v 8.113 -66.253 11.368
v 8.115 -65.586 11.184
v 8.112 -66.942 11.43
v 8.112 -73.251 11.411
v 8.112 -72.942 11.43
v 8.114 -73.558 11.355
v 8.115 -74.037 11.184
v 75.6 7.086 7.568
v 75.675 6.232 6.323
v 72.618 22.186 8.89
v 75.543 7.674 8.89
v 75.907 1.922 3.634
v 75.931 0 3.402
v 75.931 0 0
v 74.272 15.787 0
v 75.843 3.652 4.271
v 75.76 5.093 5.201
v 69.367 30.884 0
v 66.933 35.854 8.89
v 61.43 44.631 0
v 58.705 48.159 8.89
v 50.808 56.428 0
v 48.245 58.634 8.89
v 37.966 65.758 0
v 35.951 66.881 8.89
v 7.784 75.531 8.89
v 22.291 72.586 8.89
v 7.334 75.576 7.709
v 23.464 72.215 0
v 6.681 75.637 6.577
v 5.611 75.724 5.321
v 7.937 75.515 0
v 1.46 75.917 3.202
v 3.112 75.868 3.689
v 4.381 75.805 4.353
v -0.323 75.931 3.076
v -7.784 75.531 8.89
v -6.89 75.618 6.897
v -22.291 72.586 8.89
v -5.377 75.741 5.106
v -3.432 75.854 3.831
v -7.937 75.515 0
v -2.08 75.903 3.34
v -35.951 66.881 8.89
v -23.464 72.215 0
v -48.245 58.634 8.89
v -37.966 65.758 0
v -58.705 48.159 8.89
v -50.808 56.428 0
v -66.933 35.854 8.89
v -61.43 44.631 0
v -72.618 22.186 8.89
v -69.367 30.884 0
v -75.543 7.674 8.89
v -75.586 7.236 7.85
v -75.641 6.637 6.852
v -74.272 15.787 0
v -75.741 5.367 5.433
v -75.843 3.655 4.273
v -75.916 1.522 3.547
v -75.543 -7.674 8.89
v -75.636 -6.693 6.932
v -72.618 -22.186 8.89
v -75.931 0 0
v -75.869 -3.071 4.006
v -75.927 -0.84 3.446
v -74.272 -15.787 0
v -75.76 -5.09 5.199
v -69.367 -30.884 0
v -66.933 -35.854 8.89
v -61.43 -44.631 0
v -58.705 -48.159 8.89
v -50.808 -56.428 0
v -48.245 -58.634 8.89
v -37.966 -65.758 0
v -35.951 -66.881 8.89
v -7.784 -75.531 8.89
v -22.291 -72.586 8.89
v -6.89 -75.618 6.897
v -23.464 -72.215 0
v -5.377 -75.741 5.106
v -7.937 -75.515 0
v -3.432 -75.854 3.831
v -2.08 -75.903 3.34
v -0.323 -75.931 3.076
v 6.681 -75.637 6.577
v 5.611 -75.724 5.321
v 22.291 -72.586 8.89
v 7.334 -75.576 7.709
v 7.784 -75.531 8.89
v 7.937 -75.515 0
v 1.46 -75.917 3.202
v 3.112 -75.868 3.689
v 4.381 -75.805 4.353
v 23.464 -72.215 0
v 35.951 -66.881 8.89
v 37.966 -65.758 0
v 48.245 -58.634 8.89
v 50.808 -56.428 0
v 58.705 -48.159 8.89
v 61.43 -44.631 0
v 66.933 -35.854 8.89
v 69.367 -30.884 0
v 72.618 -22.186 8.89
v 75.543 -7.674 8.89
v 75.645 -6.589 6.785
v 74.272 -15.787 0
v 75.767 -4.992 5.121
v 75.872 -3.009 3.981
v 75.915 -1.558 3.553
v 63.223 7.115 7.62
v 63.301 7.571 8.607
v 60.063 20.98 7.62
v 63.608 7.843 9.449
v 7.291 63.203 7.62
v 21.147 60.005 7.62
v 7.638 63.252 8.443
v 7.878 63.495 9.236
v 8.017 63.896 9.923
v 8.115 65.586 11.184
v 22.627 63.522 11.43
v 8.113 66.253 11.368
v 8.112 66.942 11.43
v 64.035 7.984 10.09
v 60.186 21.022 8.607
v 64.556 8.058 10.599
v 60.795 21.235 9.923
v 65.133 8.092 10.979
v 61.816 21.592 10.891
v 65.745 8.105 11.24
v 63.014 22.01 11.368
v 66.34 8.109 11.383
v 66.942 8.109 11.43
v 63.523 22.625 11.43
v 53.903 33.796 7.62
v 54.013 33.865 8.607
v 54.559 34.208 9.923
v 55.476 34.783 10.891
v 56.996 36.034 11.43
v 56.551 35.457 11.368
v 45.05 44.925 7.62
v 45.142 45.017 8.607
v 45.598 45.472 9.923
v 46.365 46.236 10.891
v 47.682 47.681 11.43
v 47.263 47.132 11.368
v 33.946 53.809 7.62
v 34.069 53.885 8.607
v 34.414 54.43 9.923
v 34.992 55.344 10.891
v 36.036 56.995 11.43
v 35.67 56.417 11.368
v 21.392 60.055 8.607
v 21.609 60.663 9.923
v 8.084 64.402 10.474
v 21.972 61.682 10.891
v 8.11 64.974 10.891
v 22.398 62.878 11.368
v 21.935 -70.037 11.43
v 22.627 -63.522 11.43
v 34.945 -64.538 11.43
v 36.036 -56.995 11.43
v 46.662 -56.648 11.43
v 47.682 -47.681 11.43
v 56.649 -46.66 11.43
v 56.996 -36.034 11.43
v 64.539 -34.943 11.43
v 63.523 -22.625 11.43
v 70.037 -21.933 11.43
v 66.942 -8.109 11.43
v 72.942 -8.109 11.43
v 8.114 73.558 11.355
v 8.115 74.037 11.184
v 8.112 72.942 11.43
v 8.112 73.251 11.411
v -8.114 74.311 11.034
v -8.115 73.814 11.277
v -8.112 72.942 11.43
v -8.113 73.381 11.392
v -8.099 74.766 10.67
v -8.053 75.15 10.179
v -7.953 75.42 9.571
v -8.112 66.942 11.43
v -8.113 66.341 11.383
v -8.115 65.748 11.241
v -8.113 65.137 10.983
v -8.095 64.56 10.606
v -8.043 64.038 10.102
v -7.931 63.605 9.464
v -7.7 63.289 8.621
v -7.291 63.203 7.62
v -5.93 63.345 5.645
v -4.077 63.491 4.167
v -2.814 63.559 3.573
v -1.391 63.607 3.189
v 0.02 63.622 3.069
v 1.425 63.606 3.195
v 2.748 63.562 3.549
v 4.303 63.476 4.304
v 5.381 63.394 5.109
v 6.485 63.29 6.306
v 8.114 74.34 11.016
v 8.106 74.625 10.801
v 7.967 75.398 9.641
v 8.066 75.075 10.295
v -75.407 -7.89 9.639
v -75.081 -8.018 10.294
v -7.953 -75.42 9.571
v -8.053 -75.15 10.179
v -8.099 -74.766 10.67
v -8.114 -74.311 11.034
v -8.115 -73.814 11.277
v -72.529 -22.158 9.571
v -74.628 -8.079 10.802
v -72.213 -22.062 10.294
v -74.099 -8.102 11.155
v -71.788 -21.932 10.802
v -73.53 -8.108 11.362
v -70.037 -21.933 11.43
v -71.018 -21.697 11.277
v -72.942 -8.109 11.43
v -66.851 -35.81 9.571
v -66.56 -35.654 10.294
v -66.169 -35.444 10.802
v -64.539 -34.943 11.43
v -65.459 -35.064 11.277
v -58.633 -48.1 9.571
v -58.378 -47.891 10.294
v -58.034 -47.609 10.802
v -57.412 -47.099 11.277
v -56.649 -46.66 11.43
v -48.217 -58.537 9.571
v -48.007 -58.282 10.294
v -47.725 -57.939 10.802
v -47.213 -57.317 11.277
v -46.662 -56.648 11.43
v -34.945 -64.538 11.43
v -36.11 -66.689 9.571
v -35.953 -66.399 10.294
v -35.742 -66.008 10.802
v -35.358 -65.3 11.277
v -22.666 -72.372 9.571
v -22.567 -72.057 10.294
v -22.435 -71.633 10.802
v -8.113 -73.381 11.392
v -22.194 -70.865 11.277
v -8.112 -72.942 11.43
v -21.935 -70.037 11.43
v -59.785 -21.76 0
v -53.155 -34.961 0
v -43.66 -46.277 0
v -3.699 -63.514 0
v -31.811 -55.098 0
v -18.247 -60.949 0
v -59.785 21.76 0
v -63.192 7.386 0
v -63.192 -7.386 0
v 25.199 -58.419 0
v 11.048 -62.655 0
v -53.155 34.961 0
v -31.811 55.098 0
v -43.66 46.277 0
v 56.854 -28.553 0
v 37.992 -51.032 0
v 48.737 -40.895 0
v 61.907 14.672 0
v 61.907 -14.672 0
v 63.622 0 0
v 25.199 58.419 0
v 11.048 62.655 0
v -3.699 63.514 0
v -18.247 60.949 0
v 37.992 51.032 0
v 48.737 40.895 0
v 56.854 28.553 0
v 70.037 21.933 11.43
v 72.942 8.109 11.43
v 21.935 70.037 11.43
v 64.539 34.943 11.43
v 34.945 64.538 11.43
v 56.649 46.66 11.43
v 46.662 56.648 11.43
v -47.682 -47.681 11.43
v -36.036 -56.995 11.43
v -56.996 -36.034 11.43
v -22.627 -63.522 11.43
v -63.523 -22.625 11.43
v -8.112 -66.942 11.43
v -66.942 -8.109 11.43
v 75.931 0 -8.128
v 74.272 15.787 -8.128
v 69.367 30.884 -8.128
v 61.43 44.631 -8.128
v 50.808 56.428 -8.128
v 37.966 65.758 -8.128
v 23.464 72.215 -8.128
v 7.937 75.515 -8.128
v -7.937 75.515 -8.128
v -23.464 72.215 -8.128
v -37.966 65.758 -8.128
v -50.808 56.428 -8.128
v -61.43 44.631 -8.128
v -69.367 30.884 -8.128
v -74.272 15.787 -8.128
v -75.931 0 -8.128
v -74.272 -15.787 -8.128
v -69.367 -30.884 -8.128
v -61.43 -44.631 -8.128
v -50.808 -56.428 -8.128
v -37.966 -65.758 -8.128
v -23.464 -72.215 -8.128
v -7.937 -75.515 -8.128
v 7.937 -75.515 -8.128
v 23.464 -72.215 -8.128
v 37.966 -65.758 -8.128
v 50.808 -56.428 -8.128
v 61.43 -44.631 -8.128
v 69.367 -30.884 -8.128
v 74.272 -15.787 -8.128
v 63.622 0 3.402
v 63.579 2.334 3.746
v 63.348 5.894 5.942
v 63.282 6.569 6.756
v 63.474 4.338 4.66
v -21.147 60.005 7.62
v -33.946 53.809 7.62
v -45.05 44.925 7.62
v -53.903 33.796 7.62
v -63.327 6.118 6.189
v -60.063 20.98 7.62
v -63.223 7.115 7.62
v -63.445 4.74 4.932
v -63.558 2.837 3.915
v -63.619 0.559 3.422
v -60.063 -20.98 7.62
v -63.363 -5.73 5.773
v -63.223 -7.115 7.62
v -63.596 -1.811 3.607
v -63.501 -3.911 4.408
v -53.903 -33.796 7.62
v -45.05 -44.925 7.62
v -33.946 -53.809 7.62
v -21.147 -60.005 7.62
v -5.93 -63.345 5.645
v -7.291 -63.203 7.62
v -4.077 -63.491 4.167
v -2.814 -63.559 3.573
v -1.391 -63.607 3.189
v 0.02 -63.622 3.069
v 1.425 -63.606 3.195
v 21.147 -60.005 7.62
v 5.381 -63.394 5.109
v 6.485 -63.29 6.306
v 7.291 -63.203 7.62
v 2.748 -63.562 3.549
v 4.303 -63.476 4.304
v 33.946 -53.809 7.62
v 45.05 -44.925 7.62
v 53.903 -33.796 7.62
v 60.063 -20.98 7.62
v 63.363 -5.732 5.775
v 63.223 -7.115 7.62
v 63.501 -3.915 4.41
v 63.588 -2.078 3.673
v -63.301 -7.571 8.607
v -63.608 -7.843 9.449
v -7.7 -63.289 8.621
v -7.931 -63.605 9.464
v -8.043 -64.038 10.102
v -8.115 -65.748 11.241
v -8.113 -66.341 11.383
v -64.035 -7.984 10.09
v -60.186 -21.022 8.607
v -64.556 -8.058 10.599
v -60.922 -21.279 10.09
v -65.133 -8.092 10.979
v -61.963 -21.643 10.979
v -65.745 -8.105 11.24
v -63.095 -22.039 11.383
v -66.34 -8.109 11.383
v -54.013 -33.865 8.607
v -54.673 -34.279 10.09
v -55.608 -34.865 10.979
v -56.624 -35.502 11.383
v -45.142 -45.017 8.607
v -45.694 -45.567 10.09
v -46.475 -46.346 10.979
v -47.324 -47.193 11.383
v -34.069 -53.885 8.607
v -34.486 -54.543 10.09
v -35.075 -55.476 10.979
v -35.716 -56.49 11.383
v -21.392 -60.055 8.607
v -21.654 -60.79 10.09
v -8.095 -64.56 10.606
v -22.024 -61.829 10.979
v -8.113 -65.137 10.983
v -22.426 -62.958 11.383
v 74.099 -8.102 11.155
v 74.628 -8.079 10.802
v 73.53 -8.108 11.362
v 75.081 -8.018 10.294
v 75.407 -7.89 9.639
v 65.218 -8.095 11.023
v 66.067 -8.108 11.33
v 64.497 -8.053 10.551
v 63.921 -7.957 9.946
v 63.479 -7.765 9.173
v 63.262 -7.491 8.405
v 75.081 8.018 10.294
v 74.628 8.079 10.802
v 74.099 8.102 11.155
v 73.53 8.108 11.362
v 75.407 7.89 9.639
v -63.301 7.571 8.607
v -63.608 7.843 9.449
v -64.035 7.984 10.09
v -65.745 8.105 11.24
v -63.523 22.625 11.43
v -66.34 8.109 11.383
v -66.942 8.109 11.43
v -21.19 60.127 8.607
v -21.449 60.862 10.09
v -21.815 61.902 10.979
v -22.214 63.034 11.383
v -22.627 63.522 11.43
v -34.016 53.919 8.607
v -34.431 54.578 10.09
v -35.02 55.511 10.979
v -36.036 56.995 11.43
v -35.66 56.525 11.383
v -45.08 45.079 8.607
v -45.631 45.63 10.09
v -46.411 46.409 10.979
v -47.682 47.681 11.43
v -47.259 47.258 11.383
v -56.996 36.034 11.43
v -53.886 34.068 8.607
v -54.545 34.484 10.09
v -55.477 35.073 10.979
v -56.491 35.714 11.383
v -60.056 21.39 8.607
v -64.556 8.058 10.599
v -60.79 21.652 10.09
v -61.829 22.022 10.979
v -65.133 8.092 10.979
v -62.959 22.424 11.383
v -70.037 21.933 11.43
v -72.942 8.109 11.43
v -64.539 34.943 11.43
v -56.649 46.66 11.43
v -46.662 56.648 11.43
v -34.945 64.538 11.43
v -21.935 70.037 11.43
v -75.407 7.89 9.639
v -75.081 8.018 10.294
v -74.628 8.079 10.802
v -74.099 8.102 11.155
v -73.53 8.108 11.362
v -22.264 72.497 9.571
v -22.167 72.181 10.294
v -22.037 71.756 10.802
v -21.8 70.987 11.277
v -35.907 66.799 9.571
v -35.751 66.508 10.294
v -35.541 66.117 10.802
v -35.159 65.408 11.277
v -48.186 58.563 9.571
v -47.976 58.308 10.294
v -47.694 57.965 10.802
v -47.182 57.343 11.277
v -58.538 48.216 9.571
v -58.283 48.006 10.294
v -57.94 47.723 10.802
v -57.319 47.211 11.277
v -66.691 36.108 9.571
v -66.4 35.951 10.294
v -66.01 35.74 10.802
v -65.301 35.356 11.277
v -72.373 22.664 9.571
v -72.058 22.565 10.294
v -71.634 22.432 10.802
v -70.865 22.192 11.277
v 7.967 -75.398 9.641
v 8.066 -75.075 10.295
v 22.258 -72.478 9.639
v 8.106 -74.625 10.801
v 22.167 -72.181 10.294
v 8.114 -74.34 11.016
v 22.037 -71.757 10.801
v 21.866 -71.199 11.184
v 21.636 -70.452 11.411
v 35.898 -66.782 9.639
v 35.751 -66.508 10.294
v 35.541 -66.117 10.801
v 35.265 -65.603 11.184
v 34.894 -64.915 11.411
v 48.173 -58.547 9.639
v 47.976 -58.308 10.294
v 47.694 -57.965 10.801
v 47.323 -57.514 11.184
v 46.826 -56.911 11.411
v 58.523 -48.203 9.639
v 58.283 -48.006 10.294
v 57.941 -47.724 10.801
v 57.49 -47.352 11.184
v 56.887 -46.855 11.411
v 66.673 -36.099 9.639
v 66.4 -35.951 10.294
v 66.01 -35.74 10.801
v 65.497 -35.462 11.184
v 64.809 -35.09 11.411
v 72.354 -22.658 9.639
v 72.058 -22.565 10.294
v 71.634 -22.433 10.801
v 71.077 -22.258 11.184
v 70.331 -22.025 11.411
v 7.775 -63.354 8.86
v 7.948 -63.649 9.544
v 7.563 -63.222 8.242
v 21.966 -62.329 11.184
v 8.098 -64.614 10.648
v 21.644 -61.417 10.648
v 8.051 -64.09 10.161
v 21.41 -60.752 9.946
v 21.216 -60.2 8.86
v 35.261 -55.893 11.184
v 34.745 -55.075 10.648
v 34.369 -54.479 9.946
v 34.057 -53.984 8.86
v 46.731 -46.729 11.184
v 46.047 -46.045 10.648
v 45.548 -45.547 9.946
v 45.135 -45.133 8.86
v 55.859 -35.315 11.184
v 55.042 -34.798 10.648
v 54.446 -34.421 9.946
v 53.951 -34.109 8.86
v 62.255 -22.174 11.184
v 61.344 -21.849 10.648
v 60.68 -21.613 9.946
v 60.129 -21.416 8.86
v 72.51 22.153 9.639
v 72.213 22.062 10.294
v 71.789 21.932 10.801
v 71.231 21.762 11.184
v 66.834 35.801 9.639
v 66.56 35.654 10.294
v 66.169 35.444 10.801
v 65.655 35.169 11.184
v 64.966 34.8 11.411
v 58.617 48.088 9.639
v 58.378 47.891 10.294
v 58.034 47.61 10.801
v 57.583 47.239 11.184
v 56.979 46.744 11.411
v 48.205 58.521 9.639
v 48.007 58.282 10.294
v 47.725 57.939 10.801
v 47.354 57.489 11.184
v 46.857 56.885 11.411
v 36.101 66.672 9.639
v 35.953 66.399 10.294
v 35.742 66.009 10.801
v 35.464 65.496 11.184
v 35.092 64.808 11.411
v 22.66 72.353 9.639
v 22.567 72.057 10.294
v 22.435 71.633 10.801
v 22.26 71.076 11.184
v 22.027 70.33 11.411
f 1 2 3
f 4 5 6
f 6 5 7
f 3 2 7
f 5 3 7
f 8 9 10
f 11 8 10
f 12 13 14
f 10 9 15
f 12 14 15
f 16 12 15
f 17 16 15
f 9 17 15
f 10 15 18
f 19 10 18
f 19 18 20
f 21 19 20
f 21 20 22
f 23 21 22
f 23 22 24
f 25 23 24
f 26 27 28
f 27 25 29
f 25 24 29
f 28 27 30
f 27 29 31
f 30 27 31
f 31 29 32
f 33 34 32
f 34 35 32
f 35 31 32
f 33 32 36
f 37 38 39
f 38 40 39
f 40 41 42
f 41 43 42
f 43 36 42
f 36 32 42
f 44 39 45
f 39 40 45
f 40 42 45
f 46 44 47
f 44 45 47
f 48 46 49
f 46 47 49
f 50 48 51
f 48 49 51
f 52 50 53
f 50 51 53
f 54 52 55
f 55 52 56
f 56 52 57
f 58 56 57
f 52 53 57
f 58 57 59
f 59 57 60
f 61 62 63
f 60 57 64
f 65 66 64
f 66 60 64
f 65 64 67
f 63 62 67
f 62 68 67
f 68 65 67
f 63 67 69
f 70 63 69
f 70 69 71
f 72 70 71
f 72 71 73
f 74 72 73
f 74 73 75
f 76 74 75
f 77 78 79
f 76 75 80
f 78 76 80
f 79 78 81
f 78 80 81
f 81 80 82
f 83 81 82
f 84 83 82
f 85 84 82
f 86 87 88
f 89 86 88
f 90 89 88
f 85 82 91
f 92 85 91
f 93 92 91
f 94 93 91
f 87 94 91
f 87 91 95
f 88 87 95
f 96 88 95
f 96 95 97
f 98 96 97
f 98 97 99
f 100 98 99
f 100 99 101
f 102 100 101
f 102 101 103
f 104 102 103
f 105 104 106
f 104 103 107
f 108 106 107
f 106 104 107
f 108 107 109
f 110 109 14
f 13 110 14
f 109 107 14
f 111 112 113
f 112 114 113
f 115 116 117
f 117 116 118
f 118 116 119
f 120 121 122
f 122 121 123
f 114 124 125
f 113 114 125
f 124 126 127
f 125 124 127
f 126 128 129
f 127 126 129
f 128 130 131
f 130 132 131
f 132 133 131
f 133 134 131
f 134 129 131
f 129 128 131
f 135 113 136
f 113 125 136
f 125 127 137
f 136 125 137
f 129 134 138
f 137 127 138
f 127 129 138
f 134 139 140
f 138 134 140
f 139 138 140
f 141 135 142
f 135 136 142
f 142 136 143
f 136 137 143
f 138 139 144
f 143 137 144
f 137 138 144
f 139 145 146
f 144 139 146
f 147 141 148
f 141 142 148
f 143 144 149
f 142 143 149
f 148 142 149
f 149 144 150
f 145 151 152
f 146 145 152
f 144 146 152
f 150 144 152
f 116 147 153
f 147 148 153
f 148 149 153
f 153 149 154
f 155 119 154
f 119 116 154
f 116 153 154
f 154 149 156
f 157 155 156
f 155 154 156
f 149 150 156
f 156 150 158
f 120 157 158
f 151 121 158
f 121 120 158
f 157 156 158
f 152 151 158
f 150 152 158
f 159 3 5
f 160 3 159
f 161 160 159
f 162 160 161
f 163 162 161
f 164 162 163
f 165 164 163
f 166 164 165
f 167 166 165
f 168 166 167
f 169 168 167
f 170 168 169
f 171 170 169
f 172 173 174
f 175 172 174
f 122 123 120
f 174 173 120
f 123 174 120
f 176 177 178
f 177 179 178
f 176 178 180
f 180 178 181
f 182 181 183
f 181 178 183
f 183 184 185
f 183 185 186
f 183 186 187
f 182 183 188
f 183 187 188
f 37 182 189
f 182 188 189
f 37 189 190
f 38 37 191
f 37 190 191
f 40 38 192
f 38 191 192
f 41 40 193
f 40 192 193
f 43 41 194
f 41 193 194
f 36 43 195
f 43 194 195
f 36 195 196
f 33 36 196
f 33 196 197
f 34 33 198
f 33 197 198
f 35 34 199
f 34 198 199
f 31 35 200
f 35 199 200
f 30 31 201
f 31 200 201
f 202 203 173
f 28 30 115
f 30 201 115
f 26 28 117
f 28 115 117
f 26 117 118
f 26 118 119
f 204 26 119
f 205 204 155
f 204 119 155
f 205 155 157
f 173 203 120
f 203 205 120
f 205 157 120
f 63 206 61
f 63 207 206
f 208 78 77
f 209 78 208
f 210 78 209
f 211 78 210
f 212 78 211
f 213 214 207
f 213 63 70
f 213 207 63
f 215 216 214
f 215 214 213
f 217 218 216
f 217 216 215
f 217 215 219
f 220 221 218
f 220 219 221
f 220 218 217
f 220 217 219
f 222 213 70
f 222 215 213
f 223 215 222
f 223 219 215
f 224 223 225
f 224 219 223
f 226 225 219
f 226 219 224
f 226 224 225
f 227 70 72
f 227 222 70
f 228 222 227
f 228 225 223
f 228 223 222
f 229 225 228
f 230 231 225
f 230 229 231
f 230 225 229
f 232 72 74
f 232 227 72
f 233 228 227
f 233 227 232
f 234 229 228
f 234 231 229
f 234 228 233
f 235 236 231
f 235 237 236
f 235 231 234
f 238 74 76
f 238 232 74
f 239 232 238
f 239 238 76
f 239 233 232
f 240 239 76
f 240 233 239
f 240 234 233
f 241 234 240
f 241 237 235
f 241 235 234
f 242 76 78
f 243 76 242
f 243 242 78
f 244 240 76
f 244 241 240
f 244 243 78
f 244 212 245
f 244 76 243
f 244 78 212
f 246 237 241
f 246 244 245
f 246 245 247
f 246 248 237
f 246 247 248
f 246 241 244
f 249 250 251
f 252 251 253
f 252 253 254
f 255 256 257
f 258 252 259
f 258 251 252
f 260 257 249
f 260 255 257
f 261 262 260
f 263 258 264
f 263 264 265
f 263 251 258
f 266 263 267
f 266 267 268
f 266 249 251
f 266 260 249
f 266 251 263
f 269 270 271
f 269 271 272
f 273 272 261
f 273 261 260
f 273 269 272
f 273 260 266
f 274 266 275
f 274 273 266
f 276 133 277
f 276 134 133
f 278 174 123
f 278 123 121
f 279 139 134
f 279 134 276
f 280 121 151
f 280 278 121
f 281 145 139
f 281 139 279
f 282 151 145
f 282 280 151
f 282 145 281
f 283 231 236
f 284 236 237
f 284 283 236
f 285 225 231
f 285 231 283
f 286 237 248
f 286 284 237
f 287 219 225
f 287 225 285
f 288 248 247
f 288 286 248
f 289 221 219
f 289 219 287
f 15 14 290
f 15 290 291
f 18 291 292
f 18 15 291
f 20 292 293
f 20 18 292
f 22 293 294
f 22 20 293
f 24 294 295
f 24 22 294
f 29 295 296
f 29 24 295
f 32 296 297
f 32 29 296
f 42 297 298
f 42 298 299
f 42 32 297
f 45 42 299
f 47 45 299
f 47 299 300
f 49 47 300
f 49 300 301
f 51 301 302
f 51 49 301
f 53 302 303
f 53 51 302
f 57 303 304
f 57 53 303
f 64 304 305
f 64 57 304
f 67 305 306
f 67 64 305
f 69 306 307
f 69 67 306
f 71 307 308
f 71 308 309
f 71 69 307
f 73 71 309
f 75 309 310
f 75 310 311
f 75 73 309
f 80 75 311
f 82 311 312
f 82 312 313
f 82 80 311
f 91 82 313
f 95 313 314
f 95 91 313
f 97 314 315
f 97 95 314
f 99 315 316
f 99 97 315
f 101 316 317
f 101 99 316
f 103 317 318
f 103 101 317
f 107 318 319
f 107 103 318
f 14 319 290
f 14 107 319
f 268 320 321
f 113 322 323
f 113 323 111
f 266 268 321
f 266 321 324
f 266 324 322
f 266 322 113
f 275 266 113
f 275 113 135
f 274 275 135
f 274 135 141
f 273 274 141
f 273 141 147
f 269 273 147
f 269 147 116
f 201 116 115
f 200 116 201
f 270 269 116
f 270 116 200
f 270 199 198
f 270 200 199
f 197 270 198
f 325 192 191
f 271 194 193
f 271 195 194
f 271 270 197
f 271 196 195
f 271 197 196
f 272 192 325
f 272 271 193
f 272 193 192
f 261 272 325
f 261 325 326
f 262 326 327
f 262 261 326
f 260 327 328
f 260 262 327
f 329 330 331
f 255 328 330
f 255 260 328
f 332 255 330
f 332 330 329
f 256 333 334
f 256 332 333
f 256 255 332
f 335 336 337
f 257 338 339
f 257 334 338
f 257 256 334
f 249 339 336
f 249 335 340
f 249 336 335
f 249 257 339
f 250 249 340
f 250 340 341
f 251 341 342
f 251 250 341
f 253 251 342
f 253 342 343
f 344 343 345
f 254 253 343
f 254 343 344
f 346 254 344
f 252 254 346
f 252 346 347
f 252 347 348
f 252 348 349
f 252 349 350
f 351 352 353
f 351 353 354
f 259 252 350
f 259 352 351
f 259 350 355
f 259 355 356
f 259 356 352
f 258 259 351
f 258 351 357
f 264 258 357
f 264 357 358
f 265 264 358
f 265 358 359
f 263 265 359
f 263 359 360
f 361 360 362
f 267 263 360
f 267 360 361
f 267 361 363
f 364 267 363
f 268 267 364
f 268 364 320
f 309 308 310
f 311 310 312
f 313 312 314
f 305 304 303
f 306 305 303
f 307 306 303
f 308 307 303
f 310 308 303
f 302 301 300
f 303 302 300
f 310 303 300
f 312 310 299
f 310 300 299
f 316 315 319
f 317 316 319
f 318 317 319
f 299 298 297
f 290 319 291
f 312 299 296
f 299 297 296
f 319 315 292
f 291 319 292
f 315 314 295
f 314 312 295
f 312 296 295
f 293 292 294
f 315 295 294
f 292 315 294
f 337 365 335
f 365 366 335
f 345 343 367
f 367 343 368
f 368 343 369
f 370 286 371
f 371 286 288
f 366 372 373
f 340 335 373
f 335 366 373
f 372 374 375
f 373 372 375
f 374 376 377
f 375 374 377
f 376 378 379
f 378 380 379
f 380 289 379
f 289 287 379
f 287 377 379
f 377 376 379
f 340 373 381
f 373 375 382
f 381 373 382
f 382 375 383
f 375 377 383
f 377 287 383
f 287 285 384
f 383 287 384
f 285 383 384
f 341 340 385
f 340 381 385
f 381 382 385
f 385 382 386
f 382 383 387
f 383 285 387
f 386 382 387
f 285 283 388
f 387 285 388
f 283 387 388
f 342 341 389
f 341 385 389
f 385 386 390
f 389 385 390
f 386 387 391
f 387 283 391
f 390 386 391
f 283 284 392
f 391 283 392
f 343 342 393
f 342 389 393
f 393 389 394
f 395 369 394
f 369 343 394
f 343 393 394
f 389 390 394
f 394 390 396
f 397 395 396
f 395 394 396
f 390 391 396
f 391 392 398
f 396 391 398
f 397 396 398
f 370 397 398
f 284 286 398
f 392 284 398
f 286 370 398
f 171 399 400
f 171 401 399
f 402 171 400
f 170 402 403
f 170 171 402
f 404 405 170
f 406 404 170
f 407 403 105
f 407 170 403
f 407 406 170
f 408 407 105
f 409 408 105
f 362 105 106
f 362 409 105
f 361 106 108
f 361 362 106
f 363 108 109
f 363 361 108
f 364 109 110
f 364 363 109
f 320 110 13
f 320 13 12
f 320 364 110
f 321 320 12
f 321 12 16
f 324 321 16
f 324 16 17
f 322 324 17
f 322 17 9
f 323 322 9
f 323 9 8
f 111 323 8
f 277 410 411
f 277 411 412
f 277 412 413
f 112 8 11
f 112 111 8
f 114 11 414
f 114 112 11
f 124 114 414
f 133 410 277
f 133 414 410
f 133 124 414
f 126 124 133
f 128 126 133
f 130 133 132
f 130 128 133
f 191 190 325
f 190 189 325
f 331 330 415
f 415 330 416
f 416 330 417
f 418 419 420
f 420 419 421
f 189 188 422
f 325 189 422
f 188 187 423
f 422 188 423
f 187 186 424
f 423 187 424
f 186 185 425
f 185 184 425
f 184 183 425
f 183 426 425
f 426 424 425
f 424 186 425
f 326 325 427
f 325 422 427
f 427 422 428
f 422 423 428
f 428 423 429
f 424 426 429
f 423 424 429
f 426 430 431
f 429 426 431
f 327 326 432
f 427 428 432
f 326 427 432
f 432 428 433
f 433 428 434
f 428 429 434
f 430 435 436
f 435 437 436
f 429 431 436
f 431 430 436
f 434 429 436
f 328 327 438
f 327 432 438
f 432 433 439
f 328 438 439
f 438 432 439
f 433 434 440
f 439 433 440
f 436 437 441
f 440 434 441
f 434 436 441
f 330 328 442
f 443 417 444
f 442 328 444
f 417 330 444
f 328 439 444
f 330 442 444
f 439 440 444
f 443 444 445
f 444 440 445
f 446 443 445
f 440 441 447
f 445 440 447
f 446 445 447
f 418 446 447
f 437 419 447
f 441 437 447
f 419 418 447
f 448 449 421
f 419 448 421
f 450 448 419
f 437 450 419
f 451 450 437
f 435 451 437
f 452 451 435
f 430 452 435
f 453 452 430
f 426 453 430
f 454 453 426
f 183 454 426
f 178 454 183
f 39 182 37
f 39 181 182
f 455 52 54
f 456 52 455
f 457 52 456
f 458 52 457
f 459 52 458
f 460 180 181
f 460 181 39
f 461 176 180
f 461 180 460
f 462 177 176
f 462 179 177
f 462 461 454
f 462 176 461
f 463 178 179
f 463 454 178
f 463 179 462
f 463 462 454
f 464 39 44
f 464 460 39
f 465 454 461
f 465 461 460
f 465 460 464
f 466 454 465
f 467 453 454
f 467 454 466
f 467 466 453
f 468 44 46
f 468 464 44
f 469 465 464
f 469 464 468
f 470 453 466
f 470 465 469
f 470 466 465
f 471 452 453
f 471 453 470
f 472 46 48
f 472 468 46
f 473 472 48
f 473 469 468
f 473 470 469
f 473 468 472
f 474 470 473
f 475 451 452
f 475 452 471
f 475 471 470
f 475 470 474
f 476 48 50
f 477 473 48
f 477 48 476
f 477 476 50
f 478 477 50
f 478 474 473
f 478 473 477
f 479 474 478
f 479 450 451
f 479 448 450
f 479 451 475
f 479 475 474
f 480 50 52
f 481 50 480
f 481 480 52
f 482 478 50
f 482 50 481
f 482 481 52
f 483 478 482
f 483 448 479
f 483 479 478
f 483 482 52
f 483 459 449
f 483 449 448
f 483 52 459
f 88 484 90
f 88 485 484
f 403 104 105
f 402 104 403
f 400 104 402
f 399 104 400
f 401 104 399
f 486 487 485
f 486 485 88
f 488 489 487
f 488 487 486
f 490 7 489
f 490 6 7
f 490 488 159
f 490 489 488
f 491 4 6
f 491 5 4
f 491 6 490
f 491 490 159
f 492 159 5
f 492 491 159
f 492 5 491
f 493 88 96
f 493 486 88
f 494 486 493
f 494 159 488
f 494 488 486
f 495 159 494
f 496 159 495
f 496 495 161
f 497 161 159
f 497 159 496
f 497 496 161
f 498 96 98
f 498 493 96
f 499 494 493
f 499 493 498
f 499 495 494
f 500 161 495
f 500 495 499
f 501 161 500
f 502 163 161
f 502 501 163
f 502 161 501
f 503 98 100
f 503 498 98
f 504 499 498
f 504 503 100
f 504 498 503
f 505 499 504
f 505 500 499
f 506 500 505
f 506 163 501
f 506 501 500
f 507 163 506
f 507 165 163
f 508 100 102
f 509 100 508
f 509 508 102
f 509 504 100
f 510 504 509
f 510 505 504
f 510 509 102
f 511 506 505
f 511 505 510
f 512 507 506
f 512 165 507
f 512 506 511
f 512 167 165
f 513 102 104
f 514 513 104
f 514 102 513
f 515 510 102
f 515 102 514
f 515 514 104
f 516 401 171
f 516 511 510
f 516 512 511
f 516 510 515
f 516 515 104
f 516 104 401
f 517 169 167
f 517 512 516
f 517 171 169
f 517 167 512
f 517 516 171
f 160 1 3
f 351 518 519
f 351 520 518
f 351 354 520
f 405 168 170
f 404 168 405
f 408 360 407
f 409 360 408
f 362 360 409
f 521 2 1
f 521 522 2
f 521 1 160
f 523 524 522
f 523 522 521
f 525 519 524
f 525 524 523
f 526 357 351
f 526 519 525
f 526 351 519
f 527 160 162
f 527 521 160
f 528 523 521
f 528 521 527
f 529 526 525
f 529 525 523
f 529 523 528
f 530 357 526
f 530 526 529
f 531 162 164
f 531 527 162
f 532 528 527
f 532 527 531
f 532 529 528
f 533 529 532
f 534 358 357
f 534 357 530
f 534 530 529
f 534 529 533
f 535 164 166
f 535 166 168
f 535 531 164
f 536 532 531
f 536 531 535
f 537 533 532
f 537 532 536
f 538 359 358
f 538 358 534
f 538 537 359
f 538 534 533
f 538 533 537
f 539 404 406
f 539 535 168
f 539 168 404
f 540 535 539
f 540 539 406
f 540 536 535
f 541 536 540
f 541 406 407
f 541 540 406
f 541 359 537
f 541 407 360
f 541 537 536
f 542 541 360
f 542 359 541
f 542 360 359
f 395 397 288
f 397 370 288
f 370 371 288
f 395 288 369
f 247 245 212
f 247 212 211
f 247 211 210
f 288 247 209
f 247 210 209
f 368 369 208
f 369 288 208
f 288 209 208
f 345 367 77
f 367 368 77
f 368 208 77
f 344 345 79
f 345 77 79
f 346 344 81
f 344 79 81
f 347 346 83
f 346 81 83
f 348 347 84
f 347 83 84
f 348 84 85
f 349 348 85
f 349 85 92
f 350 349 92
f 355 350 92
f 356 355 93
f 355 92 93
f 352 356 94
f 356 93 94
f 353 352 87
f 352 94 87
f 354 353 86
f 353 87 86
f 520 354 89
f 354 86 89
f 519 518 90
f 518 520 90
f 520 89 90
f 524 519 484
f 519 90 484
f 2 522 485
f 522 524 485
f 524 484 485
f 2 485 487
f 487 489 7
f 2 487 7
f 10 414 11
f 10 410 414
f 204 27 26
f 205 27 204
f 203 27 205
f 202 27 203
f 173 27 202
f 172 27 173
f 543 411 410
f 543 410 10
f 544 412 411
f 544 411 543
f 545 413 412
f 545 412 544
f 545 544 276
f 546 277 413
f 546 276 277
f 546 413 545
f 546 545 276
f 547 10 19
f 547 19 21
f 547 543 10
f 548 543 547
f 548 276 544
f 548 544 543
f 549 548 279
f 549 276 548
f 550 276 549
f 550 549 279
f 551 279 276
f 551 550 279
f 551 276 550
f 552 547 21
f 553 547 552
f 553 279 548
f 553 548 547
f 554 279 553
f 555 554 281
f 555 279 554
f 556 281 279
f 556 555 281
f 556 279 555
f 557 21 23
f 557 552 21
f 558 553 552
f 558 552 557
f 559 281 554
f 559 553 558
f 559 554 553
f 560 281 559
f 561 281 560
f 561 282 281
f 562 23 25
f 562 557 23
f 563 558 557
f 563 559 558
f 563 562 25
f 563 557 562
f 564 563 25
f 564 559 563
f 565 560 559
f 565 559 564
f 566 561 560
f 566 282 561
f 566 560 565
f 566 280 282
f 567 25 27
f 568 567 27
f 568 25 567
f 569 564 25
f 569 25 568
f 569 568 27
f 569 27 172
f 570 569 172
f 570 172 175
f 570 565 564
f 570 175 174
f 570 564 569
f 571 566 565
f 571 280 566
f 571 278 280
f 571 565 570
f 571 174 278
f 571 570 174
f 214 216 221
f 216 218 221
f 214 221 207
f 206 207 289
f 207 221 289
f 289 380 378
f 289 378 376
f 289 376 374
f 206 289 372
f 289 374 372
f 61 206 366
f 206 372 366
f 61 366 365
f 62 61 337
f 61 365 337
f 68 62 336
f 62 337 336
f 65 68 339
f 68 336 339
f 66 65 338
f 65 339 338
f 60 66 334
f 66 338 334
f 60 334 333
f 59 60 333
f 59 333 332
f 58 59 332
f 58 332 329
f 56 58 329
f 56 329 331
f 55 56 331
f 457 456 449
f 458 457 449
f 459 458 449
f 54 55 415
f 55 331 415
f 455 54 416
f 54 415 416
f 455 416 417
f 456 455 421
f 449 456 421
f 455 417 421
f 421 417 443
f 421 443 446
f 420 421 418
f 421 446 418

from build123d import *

# Parameters (mm, degrees)
F0_R         = 75.9313176518
F0_R_2       = 63.6217413668
F1_DEPTH     = 8.128
F2_DEPTH     = 11.43
F3_R         = 8.1097941577
F4_DEPTH     = 100.33
F5_DEPTH     = 117.094
F6_R         = 8.1153
F7_DEPTH     = 85.852
F8_DEPTH     = 117.094
F9_T2_ANGLE  = 87.3226513318
F9_T4_ANGLE  = 87.3226513318
F9_T6_ANGLE  = 87.3226513318
F9_T8_ANGLE  = 87.3226513318
F10_T2_ANGLE = 92.5127162525
F10_T4_ANGLE = 92.5127162525
F10_T6_ANGLE = 92.5127162525
F10_T8_ANGLE = 92.5127162525


# Not quite as in the source:
# - a fillet or chamfer that OpenCascade refuses, or shapes differently, is made with other operations: its cross-section is extruded or revolved along the edge and cut away or added


with BuildPart() as f1:
    # F0 (on Top) → F1 (new body)
    with BuildSketch(Plane.XY):
        Circle(F0_R)
        Circle(F0_R_2, mode=Mode.SUBTRACT)
        Circle(F0_R_2)
    extrude(amount=-F1_DEPTH)

    # F0 (on Top) → F2 (join)
    with BuildSketch(Plane.XY):
        Circle(F0_R)
        Circle(F0_R_2, mode=Mode.SUBTRACT)
    extrude(amount=F2_DEPTH)

    # F3 (on Right) → F4 (cut)
    with BuildSketch(Plane.YZ):
        with Locations((0, 11.5122310817)):
            Circle(F3_R)
    extrude(amount=-F4_DEPTH, mode=Mode.SUBTRACT)

    # F3 (on Right) → F5 (cut)
    with BuildSketch(Plane.YZ):
        with Locations((0, 11.5122310817)):
            Circle(F3_R)
    extrude(amount=F5_DEPTH, mode=Mode.SUBTRACT)

    # F6 (on Front) → F7 (cut)
    with BuildSketch(Plane.XZ):
        with Locations((0, 11.1844760826)):
            Circle(F6_R)
    extrude(amount=-F7_DEPTH, mode=Mode.SUBTRACT)

    # F6 (on Front) → F8 (cut, symmetric)
    with BuildSketch(Plane.XZ):
        with Locations((0, 11.1844760826)):
            Circle(F6_R)
    extrude(amount=F8_DEPTH, both=True, mode=Mode.SUBTRACT)

    # F9: fillet of radius 2.54 on 4 edges, made by hand

    # F9_s1 → F9_t2 (revolve, cut)
    with BuildSketch(Plane(origin=(0, 0, 0), x_dir=(0, 0, 1), z_dir=(-0.999726726, -0.0233767669, 0))):
        with BuildLine():
            ThreePointArc((8.89, -75.9313176518), (10.6860512242, -75.187368876), (11.43, -73.3913176518))
            Line((11.43, -73.3913176518), (11.43, -75.9313176518))
            Line((11.43, -75.9313176518), (8.89, -75.9313176518))
        make_face()
    revolve(axis=Axis((0, 0, 11.43), (0, 0, 1)), revolution_arc=F9_T2_ANGLE, mode=Mode.SUBTRACT)

    # F9_s3 → F9_t4 (revolve, cut)
    with BuildSketch(Plane(origin=(0, 0, 0), x_dir=(0, 0, 1), z_dir=(-0.0233475312, 0.9997274092, 0))):
        with BuildLine():
            ThreePointArc((8.89, -75.9313176518), (10.6860512242, -75.187368876), (11.43, -73.3913176518))
            Line((11.43, -73.3913176518), (11.43, -75.9313176518))
            Line((11.43, -75.9313176518), (8.89, -75.9313176518))
        make_face()
    revolve(axis=Axis((0, 0, 11.43), (0, 0, 1)), revolution_arc=F9_T4_ANGLE, mode=Mode.SUBTRACT)

    # F9_s5 → F9_t6 (revolve, cut)
    with BuildSketch(Plane(origin=(0, 0, 0), x_dir=(0, 0, 1), z_dir=(0.999726726, 0.0233767669, 0))):
        with BuildLine():
            ThreePointArc((8.89, -75.9313176518), (10.6860512242, -75.187368876), (11.43, -73.3913176518))
            Line((11.43, -73.3913176518), (11.43, -75.9313176518))
            Line((11.43, -75.9313176518), (8.89, -75.9313176518))
        make_face()
    revolve(axis=Axis((0, 0, 11.43), (0, 0, 1)), revolution_arc=F9_T6_ANGLE, mode=Mode.SUBTRACT)

    # F9_s7 → F9_t8 (revolve, cut)
    with BuildSketch(Plane(origin=(0, 0, 0), x_dir=(0, 0, 1), z_dir=(0.0233475312, -0.9997274092, 0))):
        with BuildLine():
            ThreePointArc((8.89, -75.9313176518), (10.6860512242, -75.187368876), (11.43, -73.3913176518))
            Line((11.43, -73.3913176518), (11.43, -75.9313176518))
            Line((11.43, -75.9313176518), (8.89, -75.9313176518))
        make_face()
    revolve(axis=Axis((0, 0, 11.43), (0, 0, 1)), revolution_arc=F9_T8_ANGLE, mode=Mode.SUBTRACT)

    # F10: fillet of radius 3.81 on 4 edges, made by hand

    # F10_s1 → F10_t2 (revolve, cut)
    with BuildSketch(Plane(origin=(0, 0, 0), x_dir=(0, 0, 1), z_dir=(-0.9997599835, 0.0219083392, 0))):
        with BuildLine():
            ThreePointArc((11.43, -67.4317413668), (10.3140768363, -64.7376645305), (7.62, -63.6217413668))
            Line((7.62, -63.6217413668), (11.43, -63.6217413668))
            Line((11.43, -63.6217413668), (11.43, -67.4317413668))
        make_face()
    revolve(axis=Axis((0, 0, 11.43), (0, 0, 1)), revolution_arc=F10_T2_ANGLE, mode=Mode.SUBTRACT)

    # F10_s3 → F10_t4 (revolve, cut)
    with BuildSketch(Plane(origin=(0, 0, 0), x_dir=(0, 0, 1), z_dir=(-0.0219433183, -0.9997592164, 0))):
        with BuildLine():
            ThreePointArc((7.62, -63.6217413668), (10.3140768363, -64.7376645305), (11.43, -67.4317413668))
            Line((11.43, -67.4317413668), (11.43, -63.6217413668))
            Line((11.43, -63.6217413668), (7.62, -63.6217413668))
        make_face()
    revolve(axis=Axis((0, 0, 11.43), (0, 0, 1)), revolution_arc=F10_T4_ANGLE, mode=Mode.SUBTRACT)

    # F10_s5 → F10_t6 (revolve, cut)
    with BuildSketch(Plane(origin=(0, 0, 0), x_dir=(0, 0, 1), z_dir=(0.9997599835, -0.0219083392, 0))):
        with BuildLine():
            ThreePointArc((7.62, -63.6217413668), (10.3140768363, -64.7376645305), (11.43, -67.4317413668))
            Line((11.43, -67.4317413668), (11.43, -63.6217413668))
            Line((11.43, -63.6217413668), (7.62, -63.6217413668))
        make_face()
    revolve(axis=Axis((0, 0, 11.43), (0, 0, 1)), revolution_arc=F10_T6_ANGLE, mode=Mode.SUBTRACT)

    # F10_s7 → F10_t8 (revolve, cut)
    with BuildSketch(Plane(origin=(0, 0, 0), x_dir=(0, 0, 1), z_dir=(0.0219433183, 0.9997592164, 0))):
        with BuildLine():
            ThreePointArc((7.62, -63.6217413668), (10.3140768363, -64.7376645305), (11.43, -67.4317413668))
            Line((11.43, -67.4317413668), (11.43, -63.6217413668))
            Line((11.43, -63.6217413668), (7.62, -63.6217413668))
        make_face()
    revolve(axis=Axis((0, 0, 11.43), (0, 0, 1)), revolution_arc=F10_T8_ANGLE, mode=Mode.SUBTRACT)


solid = f1.part
